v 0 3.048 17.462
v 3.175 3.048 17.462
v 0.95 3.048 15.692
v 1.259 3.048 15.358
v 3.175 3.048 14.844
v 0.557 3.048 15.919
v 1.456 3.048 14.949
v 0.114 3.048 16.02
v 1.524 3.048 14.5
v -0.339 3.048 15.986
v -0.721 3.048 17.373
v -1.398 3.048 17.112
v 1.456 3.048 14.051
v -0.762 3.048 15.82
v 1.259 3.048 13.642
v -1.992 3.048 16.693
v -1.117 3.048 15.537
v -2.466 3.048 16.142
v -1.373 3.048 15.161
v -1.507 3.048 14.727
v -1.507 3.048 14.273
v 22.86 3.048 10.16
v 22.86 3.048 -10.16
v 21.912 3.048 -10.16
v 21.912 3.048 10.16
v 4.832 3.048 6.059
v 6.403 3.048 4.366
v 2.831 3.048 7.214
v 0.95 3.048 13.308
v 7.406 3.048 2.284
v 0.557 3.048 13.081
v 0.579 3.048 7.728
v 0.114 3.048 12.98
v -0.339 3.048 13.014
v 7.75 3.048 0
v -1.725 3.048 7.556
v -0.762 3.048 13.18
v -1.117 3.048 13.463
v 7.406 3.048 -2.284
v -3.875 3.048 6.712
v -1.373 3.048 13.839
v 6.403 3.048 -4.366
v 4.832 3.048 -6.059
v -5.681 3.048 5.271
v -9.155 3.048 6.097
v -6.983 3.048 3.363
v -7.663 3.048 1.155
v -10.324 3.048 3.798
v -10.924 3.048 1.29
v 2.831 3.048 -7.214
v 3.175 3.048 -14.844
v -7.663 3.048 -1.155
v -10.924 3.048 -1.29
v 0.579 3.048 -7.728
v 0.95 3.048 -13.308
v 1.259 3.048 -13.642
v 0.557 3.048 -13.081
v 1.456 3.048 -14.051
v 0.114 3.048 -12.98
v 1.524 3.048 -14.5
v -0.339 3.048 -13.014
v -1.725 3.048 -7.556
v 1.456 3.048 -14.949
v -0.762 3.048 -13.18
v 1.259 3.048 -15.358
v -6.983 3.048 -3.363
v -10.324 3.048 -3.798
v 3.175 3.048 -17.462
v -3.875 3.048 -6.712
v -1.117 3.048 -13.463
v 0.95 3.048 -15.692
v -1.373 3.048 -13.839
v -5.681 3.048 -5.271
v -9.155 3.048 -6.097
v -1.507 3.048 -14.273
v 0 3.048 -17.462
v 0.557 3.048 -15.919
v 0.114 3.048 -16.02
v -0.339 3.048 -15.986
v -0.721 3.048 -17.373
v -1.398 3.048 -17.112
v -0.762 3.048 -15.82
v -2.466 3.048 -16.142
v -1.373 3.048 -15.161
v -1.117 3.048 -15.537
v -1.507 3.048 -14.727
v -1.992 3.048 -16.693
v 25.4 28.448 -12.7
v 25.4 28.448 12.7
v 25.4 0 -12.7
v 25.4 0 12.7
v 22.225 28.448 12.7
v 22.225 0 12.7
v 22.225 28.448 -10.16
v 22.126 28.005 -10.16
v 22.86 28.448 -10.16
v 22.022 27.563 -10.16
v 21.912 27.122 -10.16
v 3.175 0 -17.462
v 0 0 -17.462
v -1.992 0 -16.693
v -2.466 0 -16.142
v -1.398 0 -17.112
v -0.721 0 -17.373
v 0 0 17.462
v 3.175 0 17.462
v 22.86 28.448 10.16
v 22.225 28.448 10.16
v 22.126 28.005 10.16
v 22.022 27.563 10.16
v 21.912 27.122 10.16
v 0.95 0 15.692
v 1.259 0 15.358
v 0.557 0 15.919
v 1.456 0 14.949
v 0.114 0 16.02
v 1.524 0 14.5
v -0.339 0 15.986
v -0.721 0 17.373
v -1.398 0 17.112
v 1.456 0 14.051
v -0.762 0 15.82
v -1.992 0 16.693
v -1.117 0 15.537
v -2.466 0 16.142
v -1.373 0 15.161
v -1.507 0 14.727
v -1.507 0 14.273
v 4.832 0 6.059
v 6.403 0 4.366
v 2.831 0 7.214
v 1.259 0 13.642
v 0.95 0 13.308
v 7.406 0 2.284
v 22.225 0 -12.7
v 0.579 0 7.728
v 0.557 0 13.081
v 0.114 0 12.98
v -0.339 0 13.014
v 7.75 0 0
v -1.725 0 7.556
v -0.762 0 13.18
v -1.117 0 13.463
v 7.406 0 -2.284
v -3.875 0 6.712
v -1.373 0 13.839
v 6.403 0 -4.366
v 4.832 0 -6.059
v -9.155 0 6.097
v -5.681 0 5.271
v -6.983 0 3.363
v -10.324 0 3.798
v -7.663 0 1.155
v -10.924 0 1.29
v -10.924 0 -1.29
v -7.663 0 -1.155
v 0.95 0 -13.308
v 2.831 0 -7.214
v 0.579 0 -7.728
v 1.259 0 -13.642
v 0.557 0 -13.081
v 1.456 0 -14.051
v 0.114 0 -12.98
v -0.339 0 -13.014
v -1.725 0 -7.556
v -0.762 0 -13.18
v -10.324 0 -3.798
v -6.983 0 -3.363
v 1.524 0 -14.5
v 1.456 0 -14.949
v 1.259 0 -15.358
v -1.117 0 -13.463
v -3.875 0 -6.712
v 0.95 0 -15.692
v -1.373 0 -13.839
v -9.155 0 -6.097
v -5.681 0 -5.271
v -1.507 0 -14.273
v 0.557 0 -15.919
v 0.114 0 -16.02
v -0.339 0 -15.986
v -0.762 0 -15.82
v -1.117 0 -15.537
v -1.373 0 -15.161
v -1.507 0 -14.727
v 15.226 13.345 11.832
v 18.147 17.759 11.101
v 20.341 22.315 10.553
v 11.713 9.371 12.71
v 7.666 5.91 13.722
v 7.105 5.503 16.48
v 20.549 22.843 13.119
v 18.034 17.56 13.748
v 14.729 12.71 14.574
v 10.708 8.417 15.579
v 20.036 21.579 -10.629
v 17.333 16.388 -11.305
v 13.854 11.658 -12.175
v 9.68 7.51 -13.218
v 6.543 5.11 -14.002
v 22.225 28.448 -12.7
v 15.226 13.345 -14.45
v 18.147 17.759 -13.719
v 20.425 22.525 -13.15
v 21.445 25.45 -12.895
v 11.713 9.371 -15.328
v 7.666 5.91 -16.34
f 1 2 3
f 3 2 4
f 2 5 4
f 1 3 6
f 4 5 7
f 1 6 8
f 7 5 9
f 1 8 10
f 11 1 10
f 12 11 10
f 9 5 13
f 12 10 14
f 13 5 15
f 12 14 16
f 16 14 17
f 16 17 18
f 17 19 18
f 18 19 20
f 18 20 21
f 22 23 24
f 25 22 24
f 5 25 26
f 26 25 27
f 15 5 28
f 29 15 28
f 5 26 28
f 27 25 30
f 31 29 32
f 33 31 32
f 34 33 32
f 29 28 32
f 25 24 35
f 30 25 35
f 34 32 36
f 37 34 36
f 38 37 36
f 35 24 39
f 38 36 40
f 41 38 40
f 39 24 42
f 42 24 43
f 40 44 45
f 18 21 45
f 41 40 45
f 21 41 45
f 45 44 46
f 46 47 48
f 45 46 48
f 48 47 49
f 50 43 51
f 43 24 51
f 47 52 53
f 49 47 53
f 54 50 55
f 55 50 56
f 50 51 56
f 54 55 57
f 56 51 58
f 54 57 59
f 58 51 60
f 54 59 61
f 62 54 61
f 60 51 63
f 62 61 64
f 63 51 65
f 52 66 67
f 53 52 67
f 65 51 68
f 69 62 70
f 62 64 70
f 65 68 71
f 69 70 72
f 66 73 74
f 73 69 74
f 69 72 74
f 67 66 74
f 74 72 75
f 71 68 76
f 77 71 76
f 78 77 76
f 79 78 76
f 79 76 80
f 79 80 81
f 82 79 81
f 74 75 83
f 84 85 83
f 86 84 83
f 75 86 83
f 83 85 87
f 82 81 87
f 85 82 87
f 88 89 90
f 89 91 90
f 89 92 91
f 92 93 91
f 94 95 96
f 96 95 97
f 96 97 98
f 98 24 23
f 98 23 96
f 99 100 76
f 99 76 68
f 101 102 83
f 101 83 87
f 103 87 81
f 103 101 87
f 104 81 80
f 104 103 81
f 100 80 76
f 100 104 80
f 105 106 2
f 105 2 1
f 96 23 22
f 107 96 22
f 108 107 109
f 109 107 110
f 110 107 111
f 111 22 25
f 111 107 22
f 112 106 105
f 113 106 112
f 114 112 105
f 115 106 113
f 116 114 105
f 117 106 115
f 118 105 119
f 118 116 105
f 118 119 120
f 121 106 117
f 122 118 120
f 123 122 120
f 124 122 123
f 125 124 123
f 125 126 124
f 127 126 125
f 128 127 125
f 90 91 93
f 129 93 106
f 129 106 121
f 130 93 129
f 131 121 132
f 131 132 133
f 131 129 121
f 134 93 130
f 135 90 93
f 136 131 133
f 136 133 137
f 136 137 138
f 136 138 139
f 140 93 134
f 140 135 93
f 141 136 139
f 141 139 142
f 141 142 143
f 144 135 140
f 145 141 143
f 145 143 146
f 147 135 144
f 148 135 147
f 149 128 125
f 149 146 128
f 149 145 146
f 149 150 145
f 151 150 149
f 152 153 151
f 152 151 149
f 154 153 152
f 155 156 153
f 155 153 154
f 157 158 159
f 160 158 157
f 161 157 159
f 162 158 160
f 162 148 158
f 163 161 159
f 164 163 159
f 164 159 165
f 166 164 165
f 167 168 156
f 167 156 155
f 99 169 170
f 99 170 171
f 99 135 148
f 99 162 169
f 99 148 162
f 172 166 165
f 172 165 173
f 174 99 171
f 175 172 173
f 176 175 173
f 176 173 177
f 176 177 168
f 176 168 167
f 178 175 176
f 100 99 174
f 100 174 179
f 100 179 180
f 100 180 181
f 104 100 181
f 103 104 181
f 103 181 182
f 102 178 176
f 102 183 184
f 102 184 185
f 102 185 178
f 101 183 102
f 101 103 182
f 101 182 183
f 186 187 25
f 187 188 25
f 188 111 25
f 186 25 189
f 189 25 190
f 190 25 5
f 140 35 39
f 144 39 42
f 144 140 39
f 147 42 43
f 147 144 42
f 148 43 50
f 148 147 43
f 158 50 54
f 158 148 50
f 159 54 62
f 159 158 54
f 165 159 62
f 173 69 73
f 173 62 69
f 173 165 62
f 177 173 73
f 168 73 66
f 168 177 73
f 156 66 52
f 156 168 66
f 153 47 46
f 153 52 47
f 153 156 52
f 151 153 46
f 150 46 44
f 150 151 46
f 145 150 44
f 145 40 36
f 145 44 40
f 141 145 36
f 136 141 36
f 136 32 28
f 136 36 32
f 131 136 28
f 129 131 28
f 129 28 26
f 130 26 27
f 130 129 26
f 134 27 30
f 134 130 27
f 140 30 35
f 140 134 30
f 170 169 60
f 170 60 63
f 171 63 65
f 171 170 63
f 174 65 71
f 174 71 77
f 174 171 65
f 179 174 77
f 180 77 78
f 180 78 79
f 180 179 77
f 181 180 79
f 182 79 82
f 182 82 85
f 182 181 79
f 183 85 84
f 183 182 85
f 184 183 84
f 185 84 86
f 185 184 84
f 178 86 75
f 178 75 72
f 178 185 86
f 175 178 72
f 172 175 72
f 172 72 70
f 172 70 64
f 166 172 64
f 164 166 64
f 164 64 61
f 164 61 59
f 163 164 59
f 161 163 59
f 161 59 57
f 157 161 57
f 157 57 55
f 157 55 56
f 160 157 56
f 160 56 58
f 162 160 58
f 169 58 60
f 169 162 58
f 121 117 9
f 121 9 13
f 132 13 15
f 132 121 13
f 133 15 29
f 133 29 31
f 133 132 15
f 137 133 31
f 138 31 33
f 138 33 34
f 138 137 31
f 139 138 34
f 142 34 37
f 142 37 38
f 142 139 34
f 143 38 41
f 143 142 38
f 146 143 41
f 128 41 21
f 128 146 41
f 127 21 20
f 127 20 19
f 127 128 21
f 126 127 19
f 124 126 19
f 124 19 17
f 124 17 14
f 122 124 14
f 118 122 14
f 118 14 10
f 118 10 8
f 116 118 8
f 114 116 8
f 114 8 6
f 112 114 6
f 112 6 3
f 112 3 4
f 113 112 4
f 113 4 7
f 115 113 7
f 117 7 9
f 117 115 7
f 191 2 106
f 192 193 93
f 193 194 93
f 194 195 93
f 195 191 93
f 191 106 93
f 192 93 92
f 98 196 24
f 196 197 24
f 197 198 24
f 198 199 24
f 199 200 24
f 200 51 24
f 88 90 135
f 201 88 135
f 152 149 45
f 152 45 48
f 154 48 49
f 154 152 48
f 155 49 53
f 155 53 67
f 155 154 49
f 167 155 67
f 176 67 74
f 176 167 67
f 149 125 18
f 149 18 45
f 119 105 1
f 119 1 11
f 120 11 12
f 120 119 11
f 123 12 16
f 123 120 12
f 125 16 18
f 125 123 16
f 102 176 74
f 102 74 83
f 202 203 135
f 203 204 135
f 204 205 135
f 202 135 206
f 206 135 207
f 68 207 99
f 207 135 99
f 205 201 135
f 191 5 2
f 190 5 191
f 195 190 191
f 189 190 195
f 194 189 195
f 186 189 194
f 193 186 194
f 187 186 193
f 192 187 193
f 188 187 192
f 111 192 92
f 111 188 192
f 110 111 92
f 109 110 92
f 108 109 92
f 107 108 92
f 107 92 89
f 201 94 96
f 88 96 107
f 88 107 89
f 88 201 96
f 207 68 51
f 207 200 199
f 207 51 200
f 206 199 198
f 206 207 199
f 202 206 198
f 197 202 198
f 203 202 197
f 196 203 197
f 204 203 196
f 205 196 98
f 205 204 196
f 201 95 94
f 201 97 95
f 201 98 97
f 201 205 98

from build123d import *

# Parameters (mm, degrees)
SKETCH1_R           = 7.75
SKETCH1_R_2         = 1.524
BOSS_EXTRUDE1_DEPTH = 3.048
BOSS_EXTRUDE2_DEPTH = 25.4
CUT_EXTRUDE1_DEPTH  = 35.925


with BuildPart() as part:
    # Sketch1 → Boss-Extrude1 (new body)
    with BuildSketch(Plane(origin=(0, 0, 0), x_dir=(1, 0, 0), z_dir=(0, 1, 0))):
        with BuildLine():
            Line((25.4, 12.7), (25.4, -12.7))
            Line((25.4, -12.7), (22.225, -12.7))
            Line((22.225, -12.7), (3.175, -17.4625))
            Line((3.175, -17.4625), (0, -17.4625))
            ThreePointArc((0, -17.4625), (-1.398490879, -17.111633495), (-2.465718563, -16.142144397))
            Line((-2.465718563, -16.142144397), (-9.155410697, -6.097413793))
            ThreePointArc((-9.155410697, -6.097413793), (-11, 0), (-9.155410697, 6.097413793))
            Line((-9.155410697, 6.097413793), (-2.465718563, 16.142144397))
            ThreePointArc((-2.465718563, 16.142144397), (-1.398490879, 17.111633495), (0, 17.4625))
            Line((0, 17.4625), (3.175, 17.4625))
            Line((3.175, 17.4625), (22.225, 12.7))
            Line((22.225, 12.7), (25.4, 12.7))
        make_face()
        Circle(SKETCH1_R, mode=Mode.SUBTRACT)
        with Locations((0, 14.5)):
            Circle(SKETCH1_R_2, mode=Mode.SUBTRACT)
        with Locations((0, -14.5)):
            Circle(SKETCH1_R_2, mode=Mode.SUBTRACT)
    extrude(amount=BOSS_EXTRUDE1_DEPTH)

    # Sketch2 → Boss-Extrude2 (add)
    with BuildSketch(Plane(origin=(0, 3.048, 0), x_dir=(1, 0, 0), z_dir=(0, 1, 0))):
        Polygon((3.175, 17.4625), (3.175, 14.844327928), (21.912311711, 10.16), (22.86, 10.16), (22.86, -10.16), (21.912311711, -10.16), (3.175, -14.844327928), (3.175, -17.4625), (22.225, -12.7), (25.4, -12.7), (25.4, 12.7), (22.225, 12.7), align=None)
    extrude(amount=BOSS_EXTRUDE2_DEPTH)

    # Sketch3 → Cut-Extrude1 (cut, through all)
    with BuildSketch(Plane(origin=(0, 0, -17.4625), x_dir=(-1, 0, 0), z_dir=(0, 0, -1))):
        with BuildLine():
            Line((-22.225, 28.448), (-3.175, 28.448))
            Line((-3.175, 28.448), (-3.175, 3.048))
            ThreePointArc((-3.175, 3.048), (-15.471871229, 13.669096578), (-22.225, 28.448))
        make_face()
    extrude(amount=-CUT_EXTRUDE1_DEPTH, mode=Mode.SUBTRACT)


solid = part.part
